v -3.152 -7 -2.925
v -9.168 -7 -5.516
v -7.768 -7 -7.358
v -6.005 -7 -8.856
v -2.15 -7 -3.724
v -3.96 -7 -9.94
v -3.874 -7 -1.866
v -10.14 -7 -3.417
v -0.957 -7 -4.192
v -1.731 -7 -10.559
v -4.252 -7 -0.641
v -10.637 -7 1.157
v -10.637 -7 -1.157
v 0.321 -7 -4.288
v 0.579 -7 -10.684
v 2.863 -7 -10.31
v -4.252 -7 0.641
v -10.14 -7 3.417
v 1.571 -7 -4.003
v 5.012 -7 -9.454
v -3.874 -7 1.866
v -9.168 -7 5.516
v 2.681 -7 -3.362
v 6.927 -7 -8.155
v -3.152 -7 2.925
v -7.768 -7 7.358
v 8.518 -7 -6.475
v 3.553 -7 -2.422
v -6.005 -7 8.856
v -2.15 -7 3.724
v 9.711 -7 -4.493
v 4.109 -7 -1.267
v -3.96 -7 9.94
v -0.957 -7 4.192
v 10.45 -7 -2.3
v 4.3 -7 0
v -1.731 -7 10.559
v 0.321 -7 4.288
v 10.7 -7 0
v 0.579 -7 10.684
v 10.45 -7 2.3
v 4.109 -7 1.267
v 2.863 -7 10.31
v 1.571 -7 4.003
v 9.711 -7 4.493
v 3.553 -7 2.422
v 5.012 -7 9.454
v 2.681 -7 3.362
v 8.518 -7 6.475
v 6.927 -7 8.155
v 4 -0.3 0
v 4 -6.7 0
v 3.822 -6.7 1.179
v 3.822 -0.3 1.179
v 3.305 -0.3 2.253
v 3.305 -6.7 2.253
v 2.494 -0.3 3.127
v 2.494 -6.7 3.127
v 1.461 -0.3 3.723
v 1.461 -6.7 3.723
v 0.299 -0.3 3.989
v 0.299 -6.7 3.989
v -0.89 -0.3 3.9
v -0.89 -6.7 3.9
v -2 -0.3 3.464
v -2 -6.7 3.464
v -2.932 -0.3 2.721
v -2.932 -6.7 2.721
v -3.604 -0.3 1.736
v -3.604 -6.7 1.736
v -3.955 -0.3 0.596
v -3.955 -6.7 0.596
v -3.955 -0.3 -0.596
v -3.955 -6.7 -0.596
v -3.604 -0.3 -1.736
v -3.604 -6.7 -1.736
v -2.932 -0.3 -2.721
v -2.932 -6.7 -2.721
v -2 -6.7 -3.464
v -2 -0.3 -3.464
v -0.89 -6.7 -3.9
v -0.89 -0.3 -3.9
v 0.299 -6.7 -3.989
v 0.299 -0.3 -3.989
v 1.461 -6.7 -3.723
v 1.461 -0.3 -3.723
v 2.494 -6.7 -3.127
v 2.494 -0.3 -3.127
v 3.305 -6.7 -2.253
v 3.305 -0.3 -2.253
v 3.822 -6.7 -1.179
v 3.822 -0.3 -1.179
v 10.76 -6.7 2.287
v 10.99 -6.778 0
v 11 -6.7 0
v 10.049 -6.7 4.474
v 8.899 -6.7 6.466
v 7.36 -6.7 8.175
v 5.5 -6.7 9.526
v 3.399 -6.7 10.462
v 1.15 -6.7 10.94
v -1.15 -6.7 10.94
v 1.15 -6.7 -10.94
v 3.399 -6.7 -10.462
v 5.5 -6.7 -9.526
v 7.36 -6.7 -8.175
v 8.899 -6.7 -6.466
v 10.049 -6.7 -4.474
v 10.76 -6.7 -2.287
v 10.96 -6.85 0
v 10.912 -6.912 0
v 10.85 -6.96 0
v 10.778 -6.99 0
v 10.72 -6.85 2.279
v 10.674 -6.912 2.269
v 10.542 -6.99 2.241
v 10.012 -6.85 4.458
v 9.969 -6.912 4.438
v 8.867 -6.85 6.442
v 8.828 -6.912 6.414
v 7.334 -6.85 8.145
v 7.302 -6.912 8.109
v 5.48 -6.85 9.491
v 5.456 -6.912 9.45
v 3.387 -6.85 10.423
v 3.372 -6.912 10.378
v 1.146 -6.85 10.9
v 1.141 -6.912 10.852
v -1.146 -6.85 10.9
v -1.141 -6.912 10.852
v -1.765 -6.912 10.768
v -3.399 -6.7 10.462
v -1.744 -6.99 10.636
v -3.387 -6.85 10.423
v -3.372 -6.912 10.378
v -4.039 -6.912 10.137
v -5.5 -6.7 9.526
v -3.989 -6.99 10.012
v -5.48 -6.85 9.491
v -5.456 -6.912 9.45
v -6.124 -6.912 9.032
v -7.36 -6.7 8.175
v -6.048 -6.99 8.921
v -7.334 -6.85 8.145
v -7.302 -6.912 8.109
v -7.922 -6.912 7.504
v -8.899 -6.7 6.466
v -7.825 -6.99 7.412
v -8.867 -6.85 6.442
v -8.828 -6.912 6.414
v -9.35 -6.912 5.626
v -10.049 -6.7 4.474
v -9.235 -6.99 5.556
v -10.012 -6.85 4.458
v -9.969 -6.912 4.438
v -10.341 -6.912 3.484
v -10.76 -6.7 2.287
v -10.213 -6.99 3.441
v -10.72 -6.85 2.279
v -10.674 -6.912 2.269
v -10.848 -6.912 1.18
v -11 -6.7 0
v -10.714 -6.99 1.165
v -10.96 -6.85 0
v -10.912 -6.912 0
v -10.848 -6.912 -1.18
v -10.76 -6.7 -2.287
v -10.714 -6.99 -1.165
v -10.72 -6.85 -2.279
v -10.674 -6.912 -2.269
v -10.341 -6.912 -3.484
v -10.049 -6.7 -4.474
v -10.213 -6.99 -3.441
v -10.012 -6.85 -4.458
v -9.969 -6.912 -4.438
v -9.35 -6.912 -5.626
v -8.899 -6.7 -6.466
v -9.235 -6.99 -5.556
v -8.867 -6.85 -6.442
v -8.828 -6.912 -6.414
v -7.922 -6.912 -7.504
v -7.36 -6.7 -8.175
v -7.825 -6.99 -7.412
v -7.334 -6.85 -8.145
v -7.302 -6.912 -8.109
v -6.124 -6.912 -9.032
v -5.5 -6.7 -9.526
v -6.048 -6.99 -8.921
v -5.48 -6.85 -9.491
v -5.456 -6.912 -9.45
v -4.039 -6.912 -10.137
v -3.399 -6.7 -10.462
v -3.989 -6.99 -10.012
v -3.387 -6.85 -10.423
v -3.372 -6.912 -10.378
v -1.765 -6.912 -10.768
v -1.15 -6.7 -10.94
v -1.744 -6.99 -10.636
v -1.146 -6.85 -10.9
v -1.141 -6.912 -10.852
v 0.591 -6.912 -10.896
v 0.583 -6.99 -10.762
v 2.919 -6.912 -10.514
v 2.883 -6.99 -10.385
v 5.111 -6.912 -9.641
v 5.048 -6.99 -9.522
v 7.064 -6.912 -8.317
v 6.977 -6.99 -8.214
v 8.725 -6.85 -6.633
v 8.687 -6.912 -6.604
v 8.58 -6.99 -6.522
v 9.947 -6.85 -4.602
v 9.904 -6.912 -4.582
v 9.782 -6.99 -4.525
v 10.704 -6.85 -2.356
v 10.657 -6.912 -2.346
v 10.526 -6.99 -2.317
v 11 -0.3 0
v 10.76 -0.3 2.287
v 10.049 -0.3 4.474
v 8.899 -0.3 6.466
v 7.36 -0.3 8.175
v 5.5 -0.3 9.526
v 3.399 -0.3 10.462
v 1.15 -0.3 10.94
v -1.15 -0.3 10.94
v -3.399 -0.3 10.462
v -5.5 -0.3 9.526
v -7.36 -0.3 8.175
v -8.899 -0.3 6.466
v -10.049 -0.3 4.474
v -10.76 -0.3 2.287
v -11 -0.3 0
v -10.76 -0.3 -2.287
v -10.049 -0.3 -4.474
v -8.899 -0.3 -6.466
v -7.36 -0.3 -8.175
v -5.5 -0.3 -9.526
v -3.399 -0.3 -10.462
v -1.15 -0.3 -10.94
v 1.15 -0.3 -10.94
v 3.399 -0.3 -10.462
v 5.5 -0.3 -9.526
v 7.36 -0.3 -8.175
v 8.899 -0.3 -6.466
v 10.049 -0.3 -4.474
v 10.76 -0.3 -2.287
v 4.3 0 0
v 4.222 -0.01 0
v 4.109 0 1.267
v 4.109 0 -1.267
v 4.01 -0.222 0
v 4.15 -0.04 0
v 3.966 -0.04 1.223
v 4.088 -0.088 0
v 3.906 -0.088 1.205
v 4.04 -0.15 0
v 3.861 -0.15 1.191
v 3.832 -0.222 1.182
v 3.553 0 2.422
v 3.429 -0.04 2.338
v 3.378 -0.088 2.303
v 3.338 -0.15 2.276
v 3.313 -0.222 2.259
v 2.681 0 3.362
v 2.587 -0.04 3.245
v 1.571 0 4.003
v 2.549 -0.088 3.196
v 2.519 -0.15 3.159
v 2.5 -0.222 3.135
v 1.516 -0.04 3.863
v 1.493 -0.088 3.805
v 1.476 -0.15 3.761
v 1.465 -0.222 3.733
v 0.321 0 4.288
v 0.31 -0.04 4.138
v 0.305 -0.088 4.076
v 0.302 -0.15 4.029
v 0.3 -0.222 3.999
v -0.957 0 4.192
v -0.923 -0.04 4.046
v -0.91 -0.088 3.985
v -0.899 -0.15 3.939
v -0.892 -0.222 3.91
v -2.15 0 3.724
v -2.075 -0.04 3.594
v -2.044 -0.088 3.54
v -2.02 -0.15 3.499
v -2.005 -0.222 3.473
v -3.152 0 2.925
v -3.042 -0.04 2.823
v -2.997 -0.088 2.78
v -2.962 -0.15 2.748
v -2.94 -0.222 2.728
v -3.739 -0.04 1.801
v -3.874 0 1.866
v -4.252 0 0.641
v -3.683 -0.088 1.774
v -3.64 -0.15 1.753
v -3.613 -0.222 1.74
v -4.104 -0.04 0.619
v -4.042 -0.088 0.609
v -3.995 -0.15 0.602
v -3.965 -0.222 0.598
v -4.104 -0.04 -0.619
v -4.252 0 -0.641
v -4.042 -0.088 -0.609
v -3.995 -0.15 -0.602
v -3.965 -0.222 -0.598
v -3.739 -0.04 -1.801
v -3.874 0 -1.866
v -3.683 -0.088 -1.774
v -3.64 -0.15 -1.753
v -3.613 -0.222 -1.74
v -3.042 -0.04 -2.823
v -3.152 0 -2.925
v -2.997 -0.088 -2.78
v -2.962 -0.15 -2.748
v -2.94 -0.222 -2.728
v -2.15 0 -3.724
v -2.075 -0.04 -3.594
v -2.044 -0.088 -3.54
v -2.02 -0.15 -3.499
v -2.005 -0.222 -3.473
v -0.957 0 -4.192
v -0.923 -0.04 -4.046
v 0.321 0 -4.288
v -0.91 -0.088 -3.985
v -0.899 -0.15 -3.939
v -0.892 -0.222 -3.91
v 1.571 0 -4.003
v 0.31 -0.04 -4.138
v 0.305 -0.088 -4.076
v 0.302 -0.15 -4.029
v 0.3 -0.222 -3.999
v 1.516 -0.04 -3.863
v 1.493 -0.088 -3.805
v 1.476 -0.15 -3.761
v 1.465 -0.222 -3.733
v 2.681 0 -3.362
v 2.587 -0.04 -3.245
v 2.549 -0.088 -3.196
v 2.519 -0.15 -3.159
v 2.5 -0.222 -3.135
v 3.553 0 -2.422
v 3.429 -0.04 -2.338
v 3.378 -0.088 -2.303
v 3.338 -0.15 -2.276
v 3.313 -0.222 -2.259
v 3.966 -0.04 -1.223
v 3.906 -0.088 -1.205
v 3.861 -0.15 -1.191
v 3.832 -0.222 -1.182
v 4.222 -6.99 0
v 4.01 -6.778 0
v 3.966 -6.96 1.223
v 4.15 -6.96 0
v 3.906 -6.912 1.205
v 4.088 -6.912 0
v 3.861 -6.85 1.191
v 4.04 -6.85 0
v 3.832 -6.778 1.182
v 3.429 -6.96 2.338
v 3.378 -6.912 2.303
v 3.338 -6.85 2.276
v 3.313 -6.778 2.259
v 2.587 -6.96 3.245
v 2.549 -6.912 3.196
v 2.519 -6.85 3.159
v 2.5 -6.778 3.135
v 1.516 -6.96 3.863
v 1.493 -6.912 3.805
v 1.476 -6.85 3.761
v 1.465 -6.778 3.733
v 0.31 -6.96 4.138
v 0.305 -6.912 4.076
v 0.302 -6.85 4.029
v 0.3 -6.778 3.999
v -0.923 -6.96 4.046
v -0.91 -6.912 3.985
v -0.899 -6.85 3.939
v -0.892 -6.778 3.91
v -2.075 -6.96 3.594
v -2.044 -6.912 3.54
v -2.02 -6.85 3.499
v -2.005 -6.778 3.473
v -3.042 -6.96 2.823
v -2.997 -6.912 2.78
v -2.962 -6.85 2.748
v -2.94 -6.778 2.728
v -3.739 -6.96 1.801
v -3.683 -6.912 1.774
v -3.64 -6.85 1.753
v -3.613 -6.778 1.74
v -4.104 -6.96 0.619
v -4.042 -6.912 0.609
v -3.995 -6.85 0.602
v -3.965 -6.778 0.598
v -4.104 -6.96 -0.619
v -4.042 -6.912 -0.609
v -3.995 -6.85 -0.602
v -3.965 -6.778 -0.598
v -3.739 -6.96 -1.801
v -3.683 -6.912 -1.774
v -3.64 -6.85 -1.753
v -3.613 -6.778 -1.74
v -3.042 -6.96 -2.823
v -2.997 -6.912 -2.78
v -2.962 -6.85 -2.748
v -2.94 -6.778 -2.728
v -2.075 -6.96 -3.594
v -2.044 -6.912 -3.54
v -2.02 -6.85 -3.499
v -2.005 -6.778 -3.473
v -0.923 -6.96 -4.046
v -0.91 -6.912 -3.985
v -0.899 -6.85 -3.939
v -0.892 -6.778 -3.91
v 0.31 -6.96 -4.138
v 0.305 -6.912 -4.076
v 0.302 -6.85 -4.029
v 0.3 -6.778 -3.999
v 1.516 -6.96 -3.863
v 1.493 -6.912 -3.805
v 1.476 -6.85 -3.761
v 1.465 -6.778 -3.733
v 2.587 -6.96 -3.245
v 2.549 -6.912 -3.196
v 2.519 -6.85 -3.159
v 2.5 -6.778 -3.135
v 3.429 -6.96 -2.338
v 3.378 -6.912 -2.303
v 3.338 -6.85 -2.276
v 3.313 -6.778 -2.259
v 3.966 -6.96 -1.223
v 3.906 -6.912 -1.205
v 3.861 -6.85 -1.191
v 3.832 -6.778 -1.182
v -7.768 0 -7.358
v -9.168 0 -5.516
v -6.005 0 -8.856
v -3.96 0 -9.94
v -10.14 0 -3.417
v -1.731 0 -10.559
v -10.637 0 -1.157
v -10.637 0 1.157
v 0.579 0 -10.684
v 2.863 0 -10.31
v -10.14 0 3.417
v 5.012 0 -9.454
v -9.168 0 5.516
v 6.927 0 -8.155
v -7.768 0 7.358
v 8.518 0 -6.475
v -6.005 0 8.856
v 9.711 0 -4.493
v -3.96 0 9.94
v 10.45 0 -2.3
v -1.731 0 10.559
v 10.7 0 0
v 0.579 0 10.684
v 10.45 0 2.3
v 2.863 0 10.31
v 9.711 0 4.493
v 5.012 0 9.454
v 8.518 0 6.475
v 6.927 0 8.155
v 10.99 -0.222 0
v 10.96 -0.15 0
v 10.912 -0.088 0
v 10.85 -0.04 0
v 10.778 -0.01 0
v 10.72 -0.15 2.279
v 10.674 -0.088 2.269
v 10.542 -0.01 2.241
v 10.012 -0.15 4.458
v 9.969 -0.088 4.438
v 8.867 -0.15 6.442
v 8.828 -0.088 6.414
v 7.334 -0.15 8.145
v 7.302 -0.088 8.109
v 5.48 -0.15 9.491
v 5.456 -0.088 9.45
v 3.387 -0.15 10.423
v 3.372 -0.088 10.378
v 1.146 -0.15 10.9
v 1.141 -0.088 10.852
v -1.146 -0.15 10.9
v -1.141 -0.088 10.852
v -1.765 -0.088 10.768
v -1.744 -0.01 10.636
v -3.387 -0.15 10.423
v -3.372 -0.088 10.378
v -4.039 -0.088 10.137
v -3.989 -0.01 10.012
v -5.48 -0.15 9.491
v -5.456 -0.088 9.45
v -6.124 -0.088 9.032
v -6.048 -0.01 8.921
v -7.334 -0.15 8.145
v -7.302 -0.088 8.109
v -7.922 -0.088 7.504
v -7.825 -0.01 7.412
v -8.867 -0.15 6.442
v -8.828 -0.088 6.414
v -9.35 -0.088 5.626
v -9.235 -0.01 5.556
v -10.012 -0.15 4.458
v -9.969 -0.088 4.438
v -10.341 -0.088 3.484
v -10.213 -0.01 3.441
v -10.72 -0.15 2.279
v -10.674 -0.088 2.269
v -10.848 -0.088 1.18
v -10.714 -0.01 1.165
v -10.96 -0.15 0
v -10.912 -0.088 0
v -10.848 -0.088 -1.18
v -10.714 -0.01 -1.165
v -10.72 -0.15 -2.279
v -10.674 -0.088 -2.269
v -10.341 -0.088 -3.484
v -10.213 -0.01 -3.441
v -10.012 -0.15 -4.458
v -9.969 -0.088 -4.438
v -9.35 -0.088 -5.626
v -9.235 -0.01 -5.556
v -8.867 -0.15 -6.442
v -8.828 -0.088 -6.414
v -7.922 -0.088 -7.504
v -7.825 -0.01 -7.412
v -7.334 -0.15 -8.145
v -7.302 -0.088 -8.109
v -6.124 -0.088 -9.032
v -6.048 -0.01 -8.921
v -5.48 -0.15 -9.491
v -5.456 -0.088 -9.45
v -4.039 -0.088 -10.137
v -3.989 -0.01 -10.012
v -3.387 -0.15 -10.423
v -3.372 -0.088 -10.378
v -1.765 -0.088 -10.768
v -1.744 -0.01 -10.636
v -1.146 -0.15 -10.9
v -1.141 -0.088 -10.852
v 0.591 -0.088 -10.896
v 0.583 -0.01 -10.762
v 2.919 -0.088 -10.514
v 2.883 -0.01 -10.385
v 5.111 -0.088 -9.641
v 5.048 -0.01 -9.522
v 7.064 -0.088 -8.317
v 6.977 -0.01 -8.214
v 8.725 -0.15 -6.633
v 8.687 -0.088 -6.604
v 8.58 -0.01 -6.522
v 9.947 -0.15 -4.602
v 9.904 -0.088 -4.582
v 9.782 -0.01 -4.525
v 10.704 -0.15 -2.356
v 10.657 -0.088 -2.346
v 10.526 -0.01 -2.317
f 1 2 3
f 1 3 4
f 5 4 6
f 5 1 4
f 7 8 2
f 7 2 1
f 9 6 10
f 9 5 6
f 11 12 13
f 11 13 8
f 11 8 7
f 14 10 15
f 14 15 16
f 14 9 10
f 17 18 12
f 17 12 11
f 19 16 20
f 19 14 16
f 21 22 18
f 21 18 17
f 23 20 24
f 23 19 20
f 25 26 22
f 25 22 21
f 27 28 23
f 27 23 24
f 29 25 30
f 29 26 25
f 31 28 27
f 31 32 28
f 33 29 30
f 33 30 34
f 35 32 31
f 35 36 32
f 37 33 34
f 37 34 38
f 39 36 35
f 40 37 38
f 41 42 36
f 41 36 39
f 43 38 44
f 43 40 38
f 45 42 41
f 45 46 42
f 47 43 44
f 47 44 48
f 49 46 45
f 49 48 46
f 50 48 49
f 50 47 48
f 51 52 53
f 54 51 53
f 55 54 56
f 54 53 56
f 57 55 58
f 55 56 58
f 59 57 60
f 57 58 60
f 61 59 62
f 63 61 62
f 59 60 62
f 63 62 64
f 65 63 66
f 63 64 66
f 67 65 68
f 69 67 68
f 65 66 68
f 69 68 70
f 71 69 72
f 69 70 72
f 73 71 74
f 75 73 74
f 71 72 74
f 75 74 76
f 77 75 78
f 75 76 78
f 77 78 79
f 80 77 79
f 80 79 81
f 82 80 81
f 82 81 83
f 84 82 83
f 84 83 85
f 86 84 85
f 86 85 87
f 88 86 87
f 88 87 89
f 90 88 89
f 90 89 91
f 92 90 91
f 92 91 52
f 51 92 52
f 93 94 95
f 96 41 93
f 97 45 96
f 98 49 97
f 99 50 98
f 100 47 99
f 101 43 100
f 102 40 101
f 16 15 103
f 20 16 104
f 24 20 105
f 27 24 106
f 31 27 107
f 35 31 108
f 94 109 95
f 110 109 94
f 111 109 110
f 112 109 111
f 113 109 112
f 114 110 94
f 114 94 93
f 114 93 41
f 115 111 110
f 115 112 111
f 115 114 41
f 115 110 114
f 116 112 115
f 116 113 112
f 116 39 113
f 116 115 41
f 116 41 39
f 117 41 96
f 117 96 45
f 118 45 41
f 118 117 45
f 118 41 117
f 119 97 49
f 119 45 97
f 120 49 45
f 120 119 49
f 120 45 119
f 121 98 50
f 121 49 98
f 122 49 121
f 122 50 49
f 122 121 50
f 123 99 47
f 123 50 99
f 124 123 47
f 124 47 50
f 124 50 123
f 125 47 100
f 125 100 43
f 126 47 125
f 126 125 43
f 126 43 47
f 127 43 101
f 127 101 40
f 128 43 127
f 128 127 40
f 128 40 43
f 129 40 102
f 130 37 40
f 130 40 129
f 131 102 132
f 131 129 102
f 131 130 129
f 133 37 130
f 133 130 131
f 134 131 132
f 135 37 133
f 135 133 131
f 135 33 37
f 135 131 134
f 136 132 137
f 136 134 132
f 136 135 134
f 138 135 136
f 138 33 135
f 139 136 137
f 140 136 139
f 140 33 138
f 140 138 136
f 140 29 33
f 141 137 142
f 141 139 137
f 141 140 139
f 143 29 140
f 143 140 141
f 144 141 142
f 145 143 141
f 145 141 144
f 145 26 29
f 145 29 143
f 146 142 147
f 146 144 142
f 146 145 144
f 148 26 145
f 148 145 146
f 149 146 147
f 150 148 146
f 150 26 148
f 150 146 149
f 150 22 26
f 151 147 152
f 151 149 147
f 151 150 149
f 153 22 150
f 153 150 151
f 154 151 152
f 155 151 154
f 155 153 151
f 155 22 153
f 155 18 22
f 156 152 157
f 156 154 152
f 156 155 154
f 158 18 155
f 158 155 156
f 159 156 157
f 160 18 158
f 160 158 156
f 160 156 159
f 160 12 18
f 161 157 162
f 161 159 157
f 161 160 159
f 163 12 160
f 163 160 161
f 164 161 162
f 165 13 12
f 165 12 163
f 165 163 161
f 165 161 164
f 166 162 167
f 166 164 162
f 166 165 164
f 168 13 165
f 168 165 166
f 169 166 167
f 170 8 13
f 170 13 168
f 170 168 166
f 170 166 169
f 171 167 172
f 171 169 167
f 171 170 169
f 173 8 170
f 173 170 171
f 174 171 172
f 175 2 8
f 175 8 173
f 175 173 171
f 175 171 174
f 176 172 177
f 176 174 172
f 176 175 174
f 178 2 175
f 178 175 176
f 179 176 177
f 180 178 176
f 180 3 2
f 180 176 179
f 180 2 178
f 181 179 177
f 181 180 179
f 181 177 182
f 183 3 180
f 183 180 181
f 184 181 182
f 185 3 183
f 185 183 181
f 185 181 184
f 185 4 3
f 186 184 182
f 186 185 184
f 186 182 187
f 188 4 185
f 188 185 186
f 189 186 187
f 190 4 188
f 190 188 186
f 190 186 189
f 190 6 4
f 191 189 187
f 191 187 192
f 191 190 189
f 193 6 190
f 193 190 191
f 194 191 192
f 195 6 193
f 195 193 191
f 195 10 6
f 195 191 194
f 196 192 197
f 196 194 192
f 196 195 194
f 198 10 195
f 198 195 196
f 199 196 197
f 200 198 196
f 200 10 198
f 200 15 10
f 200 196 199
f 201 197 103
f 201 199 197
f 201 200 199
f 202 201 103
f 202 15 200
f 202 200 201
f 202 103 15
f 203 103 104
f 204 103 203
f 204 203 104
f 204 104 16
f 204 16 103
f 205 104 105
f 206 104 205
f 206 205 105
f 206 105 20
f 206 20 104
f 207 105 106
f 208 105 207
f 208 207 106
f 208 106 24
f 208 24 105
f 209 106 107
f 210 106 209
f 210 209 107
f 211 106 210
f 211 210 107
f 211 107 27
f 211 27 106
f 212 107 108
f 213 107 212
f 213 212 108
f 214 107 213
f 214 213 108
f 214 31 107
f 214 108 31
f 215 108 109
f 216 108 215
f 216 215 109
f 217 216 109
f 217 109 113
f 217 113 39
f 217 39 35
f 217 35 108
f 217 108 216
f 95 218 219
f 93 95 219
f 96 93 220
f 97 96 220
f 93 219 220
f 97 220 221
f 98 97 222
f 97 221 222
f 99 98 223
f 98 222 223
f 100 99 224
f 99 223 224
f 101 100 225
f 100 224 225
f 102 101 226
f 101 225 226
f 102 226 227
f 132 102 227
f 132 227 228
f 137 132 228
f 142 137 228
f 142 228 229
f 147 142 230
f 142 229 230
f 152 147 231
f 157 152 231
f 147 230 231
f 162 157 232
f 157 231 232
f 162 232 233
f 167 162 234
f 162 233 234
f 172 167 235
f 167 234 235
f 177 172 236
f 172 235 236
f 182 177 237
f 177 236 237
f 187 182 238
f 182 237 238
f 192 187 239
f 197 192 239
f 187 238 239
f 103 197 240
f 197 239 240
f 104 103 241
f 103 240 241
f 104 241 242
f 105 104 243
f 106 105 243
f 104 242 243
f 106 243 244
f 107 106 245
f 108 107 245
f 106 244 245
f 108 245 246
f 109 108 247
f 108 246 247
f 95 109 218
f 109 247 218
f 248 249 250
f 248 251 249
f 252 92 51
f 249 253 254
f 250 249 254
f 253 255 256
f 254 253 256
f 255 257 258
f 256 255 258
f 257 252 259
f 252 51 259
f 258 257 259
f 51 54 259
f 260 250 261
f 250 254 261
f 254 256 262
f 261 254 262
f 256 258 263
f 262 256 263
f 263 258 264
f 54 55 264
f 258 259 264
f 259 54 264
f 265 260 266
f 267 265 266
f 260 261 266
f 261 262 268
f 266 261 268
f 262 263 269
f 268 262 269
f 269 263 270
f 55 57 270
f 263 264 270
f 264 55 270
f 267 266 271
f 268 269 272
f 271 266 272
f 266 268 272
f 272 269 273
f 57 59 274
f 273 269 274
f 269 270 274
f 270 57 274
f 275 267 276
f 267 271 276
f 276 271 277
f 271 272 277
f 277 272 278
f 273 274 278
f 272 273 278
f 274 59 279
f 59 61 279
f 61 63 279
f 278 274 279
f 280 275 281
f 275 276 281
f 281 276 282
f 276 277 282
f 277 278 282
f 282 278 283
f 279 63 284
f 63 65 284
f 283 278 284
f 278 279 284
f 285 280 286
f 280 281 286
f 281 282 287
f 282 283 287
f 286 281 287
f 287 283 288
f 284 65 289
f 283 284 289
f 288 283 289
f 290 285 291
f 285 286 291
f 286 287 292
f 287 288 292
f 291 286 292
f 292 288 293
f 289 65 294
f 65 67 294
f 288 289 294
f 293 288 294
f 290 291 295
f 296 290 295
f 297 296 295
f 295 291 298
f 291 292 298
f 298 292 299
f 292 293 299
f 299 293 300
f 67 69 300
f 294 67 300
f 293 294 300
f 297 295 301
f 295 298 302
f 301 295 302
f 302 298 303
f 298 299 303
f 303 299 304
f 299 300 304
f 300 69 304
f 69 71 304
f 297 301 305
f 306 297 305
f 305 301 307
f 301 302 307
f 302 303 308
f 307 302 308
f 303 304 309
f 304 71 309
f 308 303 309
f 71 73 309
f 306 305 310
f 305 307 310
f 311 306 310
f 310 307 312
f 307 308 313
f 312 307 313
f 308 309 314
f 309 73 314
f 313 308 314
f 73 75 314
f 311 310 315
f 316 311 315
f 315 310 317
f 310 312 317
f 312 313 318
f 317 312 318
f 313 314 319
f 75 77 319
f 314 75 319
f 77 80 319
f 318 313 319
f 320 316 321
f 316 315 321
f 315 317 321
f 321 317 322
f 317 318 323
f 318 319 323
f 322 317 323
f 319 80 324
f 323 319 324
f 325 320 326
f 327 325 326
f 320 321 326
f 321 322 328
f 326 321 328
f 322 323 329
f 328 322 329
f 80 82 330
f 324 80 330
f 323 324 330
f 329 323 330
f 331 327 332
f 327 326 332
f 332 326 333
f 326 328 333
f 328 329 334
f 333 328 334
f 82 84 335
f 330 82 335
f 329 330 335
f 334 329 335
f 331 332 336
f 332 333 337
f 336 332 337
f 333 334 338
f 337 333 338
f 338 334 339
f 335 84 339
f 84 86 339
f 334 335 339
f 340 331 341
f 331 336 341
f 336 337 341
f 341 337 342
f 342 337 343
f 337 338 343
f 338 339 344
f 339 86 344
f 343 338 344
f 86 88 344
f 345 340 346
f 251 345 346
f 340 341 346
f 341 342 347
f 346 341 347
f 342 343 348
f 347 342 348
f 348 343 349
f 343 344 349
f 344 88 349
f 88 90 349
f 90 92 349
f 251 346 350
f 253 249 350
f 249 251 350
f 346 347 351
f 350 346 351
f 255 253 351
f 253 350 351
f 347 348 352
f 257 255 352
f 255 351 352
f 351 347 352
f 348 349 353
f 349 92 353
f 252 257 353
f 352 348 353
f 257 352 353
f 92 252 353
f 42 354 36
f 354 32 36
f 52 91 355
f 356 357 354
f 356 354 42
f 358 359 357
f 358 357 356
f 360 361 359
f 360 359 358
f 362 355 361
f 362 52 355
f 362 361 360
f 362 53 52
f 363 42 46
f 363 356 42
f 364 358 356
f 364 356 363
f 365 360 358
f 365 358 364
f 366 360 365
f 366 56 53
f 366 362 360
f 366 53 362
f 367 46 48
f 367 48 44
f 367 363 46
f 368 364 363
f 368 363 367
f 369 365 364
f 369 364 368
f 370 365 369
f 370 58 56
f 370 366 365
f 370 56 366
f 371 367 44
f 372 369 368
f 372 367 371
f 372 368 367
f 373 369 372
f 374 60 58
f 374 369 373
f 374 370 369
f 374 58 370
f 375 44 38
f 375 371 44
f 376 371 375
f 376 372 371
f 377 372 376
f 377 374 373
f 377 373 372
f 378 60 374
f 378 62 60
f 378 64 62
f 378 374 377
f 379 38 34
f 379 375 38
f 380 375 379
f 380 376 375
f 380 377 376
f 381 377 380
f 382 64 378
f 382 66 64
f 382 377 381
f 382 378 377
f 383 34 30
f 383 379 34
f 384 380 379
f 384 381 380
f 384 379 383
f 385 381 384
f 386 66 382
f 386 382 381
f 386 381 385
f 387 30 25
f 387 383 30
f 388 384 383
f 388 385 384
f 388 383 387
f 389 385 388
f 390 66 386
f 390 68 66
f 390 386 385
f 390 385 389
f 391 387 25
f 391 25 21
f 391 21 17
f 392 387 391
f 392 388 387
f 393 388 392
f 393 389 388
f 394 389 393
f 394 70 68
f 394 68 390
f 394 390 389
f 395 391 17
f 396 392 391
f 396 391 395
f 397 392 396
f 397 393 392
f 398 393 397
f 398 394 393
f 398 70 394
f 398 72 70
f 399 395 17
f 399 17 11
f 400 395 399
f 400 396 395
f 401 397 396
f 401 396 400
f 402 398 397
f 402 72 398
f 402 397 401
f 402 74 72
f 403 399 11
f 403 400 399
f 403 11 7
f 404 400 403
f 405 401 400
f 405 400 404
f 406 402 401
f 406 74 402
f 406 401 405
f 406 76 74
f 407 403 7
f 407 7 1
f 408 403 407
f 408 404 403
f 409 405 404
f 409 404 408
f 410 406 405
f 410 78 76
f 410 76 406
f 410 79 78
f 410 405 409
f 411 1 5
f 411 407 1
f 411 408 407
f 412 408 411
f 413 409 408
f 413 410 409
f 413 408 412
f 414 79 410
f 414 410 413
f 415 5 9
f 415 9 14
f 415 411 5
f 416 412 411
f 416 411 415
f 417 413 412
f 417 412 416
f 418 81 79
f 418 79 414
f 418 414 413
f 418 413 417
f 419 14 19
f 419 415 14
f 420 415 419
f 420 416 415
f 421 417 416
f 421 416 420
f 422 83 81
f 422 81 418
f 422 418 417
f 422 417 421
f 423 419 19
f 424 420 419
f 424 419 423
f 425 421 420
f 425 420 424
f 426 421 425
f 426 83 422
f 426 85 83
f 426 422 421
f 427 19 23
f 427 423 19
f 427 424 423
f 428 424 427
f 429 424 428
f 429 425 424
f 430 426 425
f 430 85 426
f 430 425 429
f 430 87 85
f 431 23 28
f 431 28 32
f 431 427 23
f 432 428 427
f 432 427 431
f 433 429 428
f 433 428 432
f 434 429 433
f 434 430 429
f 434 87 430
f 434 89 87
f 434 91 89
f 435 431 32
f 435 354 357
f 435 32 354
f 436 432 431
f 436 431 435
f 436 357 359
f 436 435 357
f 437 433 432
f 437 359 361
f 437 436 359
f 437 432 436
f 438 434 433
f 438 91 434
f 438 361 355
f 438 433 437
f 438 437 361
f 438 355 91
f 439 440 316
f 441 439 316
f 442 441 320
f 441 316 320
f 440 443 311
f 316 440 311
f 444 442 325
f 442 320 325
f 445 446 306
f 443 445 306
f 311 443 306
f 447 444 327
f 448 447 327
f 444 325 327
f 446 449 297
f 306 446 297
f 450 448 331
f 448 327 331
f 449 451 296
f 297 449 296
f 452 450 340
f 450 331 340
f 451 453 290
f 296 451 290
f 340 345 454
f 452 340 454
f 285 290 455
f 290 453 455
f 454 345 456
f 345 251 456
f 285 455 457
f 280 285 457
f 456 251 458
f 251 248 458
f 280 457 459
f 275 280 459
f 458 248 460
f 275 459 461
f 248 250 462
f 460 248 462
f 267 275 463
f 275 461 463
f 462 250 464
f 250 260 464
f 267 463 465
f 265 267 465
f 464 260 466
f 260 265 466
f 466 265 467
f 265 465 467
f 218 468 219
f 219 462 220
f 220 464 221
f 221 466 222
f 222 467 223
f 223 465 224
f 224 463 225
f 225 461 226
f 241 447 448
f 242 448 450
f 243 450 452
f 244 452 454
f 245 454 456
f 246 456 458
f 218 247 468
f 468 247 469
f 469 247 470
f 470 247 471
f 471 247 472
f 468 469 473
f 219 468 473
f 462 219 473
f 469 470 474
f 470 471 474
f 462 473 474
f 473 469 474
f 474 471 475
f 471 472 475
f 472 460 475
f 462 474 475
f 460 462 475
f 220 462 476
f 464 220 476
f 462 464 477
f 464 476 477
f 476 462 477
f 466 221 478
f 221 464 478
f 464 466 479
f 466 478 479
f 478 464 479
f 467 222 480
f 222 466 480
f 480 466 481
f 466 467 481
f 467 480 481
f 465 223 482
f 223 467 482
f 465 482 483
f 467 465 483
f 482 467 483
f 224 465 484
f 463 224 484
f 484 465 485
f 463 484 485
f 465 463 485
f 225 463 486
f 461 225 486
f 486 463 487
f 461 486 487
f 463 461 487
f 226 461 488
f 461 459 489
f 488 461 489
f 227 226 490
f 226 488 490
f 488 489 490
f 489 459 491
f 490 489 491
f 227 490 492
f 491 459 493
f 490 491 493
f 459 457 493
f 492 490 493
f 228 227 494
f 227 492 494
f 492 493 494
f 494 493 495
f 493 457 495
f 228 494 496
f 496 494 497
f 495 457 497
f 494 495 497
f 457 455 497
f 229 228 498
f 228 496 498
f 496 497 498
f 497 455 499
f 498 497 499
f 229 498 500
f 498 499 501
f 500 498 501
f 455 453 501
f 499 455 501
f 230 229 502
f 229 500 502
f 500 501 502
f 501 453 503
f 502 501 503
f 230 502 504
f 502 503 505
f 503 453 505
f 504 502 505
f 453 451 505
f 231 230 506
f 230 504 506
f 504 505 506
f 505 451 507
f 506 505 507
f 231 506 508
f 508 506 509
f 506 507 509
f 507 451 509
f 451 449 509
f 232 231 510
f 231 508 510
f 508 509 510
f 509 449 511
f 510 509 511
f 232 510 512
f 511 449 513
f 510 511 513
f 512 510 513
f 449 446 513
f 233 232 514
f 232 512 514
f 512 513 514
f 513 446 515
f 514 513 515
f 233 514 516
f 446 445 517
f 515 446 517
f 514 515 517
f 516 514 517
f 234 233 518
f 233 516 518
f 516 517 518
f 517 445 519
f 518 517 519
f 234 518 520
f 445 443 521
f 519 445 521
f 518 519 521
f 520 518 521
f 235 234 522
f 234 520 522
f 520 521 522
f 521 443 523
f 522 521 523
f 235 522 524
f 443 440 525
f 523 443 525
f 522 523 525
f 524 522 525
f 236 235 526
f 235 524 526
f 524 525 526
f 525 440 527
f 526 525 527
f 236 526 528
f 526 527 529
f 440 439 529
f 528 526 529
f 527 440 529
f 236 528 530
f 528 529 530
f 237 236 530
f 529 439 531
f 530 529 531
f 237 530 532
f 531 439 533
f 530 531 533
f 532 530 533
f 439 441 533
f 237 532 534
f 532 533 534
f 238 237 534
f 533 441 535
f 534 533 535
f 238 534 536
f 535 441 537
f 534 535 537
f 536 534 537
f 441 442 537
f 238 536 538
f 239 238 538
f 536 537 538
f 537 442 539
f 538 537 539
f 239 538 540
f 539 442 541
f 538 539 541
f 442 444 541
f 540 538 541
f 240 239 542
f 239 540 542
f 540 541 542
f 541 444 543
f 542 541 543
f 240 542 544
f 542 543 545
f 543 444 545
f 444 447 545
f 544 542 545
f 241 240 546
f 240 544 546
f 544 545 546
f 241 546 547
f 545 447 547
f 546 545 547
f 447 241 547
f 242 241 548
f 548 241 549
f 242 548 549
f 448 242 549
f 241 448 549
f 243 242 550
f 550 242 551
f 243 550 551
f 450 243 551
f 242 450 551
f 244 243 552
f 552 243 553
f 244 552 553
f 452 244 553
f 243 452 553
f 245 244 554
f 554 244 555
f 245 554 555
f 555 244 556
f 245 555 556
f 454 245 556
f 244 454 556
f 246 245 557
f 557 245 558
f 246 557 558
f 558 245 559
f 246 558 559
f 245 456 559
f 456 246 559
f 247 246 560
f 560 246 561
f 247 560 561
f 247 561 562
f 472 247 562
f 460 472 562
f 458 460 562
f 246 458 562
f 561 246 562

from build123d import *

# Parameters (mm, degrees)
F0_R     = 11
F1_DEPTH = 7
F2_R     = 4
F3_DEPTH = 25
F4_R     = 0.3


with BuildPart() as f1:
    # F0 (on Front) → F1 (new body)
    with BuildSketch(Plane.XZ):
        Circle(F0_R)
    extrude(amount=F1_DEPTH)

    # F2 (on face) → F3 (cut)
    with BuildSketch(Plane.XZ.offset(7)):
        Circle(F2_R)
    extrude(amount=-F3_DEPTH, mode=Mode.SUBTRACT)

    # F4
    f4_edges = [f1.edges().sort_by_distance(p)[0] for p in [
        (-11, -7, 0),
        (-11, 0, 0),
        (-4, 0, 0),
        (-4, -7, 0),
    ]]
    fillet(f4_edges, radius=F4_R)


solid = f1.part
